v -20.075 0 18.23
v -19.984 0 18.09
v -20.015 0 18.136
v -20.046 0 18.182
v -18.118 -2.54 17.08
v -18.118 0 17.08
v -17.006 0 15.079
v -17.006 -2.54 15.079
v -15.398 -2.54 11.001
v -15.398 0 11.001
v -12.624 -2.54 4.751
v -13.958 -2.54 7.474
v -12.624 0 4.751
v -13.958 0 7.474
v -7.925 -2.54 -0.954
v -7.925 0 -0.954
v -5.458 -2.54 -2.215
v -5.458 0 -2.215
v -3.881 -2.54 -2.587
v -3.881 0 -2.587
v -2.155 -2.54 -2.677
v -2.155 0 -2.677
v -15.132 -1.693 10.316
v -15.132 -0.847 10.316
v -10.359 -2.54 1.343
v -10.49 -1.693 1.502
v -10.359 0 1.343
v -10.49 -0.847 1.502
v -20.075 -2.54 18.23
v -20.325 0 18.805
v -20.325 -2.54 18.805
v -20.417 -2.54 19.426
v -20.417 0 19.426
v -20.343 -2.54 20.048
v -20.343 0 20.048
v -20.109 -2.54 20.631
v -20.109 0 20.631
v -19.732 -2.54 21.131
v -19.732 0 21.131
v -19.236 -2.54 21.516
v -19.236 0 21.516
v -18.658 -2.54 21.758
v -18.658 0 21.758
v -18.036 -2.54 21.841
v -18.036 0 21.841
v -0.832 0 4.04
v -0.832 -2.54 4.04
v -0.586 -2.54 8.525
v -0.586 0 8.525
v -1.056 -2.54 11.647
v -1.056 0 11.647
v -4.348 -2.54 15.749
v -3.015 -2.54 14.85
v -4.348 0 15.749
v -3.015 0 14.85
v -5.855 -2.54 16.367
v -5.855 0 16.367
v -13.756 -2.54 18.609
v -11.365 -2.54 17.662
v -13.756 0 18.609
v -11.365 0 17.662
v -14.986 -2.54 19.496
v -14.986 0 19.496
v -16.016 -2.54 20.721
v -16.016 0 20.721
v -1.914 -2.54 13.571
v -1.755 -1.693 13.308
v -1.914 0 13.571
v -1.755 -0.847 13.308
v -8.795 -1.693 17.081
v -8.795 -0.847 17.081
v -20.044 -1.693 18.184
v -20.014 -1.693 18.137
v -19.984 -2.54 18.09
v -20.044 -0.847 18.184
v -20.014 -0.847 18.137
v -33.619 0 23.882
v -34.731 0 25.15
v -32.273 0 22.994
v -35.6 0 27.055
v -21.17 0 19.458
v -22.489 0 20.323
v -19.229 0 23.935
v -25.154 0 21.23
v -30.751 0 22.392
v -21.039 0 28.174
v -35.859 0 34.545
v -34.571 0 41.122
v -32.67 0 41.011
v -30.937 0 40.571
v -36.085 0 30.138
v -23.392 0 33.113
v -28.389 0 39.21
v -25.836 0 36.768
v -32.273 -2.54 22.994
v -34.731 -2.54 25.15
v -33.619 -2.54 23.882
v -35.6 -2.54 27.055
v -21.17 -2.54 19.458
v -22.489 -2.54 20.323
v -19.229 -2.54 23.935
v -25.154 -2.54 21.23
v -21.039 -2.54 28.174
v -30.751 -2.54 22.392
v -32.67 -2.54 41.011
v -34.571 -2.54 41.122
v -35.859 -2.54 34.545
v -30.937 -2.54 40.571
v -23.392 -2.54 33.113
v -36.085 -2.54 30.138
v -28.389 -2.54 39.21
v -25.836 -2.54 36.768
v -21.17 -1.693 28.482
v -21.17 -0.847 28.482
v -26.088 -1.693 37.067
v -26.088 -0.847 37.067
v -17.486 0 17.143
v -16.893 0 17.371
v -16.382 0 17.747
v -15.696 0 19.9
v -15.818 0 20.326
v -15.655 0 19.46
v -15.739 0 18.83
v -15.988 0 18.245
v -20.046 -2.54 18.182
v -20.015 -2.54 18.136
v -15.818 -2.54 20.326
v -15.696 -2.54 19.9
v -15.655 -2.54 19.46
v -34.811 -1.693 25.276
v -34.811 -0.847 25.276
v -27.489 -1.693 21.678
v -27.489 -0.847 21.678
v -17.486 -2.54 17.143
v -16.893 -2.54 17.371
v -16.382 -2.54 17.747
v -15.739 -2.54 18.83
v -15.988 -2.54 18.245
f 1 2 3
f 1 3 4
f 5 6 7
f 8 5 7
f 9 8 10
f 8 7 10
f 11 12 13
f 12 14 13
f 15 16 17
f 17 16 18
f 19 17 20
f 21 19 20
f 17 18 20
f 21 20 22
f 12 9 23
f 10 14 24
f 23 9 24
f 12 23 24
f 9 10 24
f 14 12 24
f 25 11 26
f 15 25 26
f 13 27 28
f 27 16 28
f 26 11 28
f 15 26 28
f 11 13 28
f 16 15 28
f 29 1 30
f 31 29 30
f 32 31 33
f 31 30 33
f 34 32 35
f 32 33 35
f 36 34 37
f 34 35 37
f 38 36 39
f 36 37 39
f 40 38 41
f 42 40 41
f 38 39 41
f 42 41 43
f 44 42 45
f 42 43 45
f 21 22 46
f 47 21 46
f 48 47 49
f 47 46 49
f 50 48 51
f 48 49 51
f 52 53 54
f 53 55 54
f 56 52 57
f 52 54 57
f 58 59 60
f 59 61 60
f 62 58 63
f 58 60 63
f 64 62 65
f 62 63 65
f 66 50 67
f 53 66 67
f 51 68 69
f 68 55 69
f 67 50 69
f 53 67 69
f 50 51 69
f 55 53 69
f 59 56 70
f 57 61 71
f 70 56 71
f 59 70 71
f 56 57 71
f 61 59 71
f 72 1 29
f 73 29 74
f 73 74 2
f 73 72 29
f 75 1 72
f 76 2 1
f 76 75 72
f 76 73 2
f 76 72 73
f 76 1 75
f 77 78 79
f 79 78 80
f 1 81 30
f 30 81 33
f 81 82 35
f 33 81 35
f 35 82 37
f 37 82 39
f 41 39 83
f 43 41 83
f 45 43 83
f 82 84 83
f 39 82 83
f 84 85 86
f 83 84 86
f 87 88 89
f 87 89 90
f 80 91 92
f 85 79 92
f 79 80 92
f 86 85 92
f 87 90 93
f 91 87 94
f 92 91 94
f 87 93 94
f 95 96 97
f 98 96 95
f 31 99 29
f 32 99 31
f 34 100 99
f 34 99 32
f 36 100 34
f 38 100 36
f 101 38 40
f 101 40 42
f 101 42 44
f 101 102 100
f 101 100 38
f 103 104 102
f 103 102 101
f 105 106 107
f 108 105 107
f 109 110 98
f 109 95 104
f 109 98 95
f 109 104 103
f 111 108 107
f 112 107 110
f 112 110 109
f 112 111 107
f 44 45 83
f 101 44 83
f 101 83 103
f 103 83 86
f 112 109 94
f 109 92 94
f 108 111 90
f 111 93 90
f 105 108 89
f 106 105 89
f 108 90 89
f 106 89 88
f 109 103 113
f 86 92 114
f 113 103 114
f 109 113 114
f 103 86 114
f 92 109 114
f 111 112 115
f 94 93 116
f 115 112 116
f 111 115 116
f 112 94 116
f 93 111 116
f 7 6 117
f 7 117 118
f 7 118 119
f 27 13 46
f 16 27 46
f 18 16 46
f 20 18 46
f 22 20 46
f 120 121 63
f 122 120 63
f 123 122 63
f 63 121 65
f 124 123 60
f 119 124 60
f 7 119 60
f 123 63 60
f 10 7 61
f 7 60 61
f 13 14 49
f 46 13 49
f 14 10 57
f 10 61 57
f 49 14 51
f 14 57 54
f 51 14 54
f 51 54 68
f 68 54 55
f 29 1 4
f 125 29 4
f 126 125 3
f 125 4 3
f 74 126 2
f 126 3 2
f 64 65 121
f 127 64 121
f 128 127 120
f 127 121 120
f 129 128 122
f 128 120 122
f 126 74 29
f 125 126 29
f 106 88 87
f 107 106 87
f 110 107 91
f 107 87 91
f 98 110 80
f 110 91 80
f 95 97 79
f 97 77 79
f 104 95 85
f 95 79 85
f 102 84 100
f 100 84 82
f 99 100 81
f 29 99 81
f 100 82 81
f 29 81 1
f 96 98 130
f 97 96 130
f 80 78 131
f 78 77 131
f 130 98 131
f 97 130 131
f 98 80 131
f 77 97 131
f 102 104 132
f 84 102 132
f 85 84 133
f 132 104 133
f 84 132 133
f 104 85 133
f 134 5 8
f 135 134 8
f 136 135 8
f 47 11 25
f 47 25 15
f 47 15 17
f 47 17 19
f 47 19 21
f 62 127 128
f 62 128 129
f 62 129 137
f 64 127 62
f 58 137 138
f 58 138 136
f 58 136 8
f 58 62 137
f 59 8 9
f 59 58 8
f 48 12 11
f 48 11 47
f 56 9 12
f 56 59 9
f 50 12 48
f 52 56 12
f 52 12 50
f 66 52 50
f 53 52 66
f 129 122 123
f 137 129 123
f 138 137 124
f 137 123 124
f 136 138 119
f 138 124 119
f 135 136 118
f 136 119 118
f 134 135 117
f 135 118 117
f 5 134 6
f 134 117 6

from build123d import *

# Parameters (mm, degrees)
F1_DEPTH = 2.54


with BuildPart() as f1:
    # F0 (on Front) → F1 (new body)
    with BuildSketch(Plane.XZ):
        with BuildLine():
            ThreePointArc((-20.074885, 18.229861), (-20.109369, 20.630582), (-18.03584, 21.841008))
            add(Edge.make_bspline(
                [(-18.03584, 21.841008), (-20.872474, 25.352406), (-23.711583, 41.488953), (-34.571076, 41.121723)],
                knots=[0, 0, 0, 0, 25.4, 25.4, 25.4, 25.4], degree=3))
            add(Edge.make_bspline(
                [(-34.571076, 41.121723), (-41.082308, 15.120087), (-25.045967, 25.635282), (-20.074885, 18.229861)],
                knots=[0, 0, 0, 0, 27.094619, 27.094619, 27.094619, 27.094619], degree=3))
        make_face()
        with BuildLine():
            add(Edge.make_bspline(
                [(-20.074885, 18.229861), (-20.044033, 18.1839), (-20.013606, 18.137249), (-19.983614, 18.089894)],
                knots=[27.094619, 27.094619, 27.094619, 27.094619, 27.26278, 27.26278, 27.26278, 27.26278], degree=3))
            ThreePointArc((-20.074885, 18.229861), (-20.030478, 18.159077), (-19.983614, 18.089894))
        make_face()
        with BuildLine():
            add(Edge.make_bspline(
                [(-2.154803, -2.676631), (4.385332, 23.440424), (-11.124635, 13.120344), (-16.015994, 20.720937)],
                knots=[0, 0, 0, 0, 27.195118, 27.195118, 27.195118, 27.195118], degree=3))
            ThreePointArc((-16.015994, 20.720937), (-15.746723, 20.115728), (-15.65459, 19.459758))
            ThreePointArc((-15.65459, 19.459758), (-16.381505, 17.747003), (-18.118446, 17.079941))
            add(Edge.make_bspline(
                [(-18.118446, 17.079941), (-15.281812, 13.568543), (-13.014296, -3.04386), (-2.154803, -2.676631)],
                knots=[0, 0, 0, 0, 25.4, 25.4, 25.4, 25.4], degree=3))
        make_face()
    extrude(amount=F1_DEPTH)


solid = f1.part
